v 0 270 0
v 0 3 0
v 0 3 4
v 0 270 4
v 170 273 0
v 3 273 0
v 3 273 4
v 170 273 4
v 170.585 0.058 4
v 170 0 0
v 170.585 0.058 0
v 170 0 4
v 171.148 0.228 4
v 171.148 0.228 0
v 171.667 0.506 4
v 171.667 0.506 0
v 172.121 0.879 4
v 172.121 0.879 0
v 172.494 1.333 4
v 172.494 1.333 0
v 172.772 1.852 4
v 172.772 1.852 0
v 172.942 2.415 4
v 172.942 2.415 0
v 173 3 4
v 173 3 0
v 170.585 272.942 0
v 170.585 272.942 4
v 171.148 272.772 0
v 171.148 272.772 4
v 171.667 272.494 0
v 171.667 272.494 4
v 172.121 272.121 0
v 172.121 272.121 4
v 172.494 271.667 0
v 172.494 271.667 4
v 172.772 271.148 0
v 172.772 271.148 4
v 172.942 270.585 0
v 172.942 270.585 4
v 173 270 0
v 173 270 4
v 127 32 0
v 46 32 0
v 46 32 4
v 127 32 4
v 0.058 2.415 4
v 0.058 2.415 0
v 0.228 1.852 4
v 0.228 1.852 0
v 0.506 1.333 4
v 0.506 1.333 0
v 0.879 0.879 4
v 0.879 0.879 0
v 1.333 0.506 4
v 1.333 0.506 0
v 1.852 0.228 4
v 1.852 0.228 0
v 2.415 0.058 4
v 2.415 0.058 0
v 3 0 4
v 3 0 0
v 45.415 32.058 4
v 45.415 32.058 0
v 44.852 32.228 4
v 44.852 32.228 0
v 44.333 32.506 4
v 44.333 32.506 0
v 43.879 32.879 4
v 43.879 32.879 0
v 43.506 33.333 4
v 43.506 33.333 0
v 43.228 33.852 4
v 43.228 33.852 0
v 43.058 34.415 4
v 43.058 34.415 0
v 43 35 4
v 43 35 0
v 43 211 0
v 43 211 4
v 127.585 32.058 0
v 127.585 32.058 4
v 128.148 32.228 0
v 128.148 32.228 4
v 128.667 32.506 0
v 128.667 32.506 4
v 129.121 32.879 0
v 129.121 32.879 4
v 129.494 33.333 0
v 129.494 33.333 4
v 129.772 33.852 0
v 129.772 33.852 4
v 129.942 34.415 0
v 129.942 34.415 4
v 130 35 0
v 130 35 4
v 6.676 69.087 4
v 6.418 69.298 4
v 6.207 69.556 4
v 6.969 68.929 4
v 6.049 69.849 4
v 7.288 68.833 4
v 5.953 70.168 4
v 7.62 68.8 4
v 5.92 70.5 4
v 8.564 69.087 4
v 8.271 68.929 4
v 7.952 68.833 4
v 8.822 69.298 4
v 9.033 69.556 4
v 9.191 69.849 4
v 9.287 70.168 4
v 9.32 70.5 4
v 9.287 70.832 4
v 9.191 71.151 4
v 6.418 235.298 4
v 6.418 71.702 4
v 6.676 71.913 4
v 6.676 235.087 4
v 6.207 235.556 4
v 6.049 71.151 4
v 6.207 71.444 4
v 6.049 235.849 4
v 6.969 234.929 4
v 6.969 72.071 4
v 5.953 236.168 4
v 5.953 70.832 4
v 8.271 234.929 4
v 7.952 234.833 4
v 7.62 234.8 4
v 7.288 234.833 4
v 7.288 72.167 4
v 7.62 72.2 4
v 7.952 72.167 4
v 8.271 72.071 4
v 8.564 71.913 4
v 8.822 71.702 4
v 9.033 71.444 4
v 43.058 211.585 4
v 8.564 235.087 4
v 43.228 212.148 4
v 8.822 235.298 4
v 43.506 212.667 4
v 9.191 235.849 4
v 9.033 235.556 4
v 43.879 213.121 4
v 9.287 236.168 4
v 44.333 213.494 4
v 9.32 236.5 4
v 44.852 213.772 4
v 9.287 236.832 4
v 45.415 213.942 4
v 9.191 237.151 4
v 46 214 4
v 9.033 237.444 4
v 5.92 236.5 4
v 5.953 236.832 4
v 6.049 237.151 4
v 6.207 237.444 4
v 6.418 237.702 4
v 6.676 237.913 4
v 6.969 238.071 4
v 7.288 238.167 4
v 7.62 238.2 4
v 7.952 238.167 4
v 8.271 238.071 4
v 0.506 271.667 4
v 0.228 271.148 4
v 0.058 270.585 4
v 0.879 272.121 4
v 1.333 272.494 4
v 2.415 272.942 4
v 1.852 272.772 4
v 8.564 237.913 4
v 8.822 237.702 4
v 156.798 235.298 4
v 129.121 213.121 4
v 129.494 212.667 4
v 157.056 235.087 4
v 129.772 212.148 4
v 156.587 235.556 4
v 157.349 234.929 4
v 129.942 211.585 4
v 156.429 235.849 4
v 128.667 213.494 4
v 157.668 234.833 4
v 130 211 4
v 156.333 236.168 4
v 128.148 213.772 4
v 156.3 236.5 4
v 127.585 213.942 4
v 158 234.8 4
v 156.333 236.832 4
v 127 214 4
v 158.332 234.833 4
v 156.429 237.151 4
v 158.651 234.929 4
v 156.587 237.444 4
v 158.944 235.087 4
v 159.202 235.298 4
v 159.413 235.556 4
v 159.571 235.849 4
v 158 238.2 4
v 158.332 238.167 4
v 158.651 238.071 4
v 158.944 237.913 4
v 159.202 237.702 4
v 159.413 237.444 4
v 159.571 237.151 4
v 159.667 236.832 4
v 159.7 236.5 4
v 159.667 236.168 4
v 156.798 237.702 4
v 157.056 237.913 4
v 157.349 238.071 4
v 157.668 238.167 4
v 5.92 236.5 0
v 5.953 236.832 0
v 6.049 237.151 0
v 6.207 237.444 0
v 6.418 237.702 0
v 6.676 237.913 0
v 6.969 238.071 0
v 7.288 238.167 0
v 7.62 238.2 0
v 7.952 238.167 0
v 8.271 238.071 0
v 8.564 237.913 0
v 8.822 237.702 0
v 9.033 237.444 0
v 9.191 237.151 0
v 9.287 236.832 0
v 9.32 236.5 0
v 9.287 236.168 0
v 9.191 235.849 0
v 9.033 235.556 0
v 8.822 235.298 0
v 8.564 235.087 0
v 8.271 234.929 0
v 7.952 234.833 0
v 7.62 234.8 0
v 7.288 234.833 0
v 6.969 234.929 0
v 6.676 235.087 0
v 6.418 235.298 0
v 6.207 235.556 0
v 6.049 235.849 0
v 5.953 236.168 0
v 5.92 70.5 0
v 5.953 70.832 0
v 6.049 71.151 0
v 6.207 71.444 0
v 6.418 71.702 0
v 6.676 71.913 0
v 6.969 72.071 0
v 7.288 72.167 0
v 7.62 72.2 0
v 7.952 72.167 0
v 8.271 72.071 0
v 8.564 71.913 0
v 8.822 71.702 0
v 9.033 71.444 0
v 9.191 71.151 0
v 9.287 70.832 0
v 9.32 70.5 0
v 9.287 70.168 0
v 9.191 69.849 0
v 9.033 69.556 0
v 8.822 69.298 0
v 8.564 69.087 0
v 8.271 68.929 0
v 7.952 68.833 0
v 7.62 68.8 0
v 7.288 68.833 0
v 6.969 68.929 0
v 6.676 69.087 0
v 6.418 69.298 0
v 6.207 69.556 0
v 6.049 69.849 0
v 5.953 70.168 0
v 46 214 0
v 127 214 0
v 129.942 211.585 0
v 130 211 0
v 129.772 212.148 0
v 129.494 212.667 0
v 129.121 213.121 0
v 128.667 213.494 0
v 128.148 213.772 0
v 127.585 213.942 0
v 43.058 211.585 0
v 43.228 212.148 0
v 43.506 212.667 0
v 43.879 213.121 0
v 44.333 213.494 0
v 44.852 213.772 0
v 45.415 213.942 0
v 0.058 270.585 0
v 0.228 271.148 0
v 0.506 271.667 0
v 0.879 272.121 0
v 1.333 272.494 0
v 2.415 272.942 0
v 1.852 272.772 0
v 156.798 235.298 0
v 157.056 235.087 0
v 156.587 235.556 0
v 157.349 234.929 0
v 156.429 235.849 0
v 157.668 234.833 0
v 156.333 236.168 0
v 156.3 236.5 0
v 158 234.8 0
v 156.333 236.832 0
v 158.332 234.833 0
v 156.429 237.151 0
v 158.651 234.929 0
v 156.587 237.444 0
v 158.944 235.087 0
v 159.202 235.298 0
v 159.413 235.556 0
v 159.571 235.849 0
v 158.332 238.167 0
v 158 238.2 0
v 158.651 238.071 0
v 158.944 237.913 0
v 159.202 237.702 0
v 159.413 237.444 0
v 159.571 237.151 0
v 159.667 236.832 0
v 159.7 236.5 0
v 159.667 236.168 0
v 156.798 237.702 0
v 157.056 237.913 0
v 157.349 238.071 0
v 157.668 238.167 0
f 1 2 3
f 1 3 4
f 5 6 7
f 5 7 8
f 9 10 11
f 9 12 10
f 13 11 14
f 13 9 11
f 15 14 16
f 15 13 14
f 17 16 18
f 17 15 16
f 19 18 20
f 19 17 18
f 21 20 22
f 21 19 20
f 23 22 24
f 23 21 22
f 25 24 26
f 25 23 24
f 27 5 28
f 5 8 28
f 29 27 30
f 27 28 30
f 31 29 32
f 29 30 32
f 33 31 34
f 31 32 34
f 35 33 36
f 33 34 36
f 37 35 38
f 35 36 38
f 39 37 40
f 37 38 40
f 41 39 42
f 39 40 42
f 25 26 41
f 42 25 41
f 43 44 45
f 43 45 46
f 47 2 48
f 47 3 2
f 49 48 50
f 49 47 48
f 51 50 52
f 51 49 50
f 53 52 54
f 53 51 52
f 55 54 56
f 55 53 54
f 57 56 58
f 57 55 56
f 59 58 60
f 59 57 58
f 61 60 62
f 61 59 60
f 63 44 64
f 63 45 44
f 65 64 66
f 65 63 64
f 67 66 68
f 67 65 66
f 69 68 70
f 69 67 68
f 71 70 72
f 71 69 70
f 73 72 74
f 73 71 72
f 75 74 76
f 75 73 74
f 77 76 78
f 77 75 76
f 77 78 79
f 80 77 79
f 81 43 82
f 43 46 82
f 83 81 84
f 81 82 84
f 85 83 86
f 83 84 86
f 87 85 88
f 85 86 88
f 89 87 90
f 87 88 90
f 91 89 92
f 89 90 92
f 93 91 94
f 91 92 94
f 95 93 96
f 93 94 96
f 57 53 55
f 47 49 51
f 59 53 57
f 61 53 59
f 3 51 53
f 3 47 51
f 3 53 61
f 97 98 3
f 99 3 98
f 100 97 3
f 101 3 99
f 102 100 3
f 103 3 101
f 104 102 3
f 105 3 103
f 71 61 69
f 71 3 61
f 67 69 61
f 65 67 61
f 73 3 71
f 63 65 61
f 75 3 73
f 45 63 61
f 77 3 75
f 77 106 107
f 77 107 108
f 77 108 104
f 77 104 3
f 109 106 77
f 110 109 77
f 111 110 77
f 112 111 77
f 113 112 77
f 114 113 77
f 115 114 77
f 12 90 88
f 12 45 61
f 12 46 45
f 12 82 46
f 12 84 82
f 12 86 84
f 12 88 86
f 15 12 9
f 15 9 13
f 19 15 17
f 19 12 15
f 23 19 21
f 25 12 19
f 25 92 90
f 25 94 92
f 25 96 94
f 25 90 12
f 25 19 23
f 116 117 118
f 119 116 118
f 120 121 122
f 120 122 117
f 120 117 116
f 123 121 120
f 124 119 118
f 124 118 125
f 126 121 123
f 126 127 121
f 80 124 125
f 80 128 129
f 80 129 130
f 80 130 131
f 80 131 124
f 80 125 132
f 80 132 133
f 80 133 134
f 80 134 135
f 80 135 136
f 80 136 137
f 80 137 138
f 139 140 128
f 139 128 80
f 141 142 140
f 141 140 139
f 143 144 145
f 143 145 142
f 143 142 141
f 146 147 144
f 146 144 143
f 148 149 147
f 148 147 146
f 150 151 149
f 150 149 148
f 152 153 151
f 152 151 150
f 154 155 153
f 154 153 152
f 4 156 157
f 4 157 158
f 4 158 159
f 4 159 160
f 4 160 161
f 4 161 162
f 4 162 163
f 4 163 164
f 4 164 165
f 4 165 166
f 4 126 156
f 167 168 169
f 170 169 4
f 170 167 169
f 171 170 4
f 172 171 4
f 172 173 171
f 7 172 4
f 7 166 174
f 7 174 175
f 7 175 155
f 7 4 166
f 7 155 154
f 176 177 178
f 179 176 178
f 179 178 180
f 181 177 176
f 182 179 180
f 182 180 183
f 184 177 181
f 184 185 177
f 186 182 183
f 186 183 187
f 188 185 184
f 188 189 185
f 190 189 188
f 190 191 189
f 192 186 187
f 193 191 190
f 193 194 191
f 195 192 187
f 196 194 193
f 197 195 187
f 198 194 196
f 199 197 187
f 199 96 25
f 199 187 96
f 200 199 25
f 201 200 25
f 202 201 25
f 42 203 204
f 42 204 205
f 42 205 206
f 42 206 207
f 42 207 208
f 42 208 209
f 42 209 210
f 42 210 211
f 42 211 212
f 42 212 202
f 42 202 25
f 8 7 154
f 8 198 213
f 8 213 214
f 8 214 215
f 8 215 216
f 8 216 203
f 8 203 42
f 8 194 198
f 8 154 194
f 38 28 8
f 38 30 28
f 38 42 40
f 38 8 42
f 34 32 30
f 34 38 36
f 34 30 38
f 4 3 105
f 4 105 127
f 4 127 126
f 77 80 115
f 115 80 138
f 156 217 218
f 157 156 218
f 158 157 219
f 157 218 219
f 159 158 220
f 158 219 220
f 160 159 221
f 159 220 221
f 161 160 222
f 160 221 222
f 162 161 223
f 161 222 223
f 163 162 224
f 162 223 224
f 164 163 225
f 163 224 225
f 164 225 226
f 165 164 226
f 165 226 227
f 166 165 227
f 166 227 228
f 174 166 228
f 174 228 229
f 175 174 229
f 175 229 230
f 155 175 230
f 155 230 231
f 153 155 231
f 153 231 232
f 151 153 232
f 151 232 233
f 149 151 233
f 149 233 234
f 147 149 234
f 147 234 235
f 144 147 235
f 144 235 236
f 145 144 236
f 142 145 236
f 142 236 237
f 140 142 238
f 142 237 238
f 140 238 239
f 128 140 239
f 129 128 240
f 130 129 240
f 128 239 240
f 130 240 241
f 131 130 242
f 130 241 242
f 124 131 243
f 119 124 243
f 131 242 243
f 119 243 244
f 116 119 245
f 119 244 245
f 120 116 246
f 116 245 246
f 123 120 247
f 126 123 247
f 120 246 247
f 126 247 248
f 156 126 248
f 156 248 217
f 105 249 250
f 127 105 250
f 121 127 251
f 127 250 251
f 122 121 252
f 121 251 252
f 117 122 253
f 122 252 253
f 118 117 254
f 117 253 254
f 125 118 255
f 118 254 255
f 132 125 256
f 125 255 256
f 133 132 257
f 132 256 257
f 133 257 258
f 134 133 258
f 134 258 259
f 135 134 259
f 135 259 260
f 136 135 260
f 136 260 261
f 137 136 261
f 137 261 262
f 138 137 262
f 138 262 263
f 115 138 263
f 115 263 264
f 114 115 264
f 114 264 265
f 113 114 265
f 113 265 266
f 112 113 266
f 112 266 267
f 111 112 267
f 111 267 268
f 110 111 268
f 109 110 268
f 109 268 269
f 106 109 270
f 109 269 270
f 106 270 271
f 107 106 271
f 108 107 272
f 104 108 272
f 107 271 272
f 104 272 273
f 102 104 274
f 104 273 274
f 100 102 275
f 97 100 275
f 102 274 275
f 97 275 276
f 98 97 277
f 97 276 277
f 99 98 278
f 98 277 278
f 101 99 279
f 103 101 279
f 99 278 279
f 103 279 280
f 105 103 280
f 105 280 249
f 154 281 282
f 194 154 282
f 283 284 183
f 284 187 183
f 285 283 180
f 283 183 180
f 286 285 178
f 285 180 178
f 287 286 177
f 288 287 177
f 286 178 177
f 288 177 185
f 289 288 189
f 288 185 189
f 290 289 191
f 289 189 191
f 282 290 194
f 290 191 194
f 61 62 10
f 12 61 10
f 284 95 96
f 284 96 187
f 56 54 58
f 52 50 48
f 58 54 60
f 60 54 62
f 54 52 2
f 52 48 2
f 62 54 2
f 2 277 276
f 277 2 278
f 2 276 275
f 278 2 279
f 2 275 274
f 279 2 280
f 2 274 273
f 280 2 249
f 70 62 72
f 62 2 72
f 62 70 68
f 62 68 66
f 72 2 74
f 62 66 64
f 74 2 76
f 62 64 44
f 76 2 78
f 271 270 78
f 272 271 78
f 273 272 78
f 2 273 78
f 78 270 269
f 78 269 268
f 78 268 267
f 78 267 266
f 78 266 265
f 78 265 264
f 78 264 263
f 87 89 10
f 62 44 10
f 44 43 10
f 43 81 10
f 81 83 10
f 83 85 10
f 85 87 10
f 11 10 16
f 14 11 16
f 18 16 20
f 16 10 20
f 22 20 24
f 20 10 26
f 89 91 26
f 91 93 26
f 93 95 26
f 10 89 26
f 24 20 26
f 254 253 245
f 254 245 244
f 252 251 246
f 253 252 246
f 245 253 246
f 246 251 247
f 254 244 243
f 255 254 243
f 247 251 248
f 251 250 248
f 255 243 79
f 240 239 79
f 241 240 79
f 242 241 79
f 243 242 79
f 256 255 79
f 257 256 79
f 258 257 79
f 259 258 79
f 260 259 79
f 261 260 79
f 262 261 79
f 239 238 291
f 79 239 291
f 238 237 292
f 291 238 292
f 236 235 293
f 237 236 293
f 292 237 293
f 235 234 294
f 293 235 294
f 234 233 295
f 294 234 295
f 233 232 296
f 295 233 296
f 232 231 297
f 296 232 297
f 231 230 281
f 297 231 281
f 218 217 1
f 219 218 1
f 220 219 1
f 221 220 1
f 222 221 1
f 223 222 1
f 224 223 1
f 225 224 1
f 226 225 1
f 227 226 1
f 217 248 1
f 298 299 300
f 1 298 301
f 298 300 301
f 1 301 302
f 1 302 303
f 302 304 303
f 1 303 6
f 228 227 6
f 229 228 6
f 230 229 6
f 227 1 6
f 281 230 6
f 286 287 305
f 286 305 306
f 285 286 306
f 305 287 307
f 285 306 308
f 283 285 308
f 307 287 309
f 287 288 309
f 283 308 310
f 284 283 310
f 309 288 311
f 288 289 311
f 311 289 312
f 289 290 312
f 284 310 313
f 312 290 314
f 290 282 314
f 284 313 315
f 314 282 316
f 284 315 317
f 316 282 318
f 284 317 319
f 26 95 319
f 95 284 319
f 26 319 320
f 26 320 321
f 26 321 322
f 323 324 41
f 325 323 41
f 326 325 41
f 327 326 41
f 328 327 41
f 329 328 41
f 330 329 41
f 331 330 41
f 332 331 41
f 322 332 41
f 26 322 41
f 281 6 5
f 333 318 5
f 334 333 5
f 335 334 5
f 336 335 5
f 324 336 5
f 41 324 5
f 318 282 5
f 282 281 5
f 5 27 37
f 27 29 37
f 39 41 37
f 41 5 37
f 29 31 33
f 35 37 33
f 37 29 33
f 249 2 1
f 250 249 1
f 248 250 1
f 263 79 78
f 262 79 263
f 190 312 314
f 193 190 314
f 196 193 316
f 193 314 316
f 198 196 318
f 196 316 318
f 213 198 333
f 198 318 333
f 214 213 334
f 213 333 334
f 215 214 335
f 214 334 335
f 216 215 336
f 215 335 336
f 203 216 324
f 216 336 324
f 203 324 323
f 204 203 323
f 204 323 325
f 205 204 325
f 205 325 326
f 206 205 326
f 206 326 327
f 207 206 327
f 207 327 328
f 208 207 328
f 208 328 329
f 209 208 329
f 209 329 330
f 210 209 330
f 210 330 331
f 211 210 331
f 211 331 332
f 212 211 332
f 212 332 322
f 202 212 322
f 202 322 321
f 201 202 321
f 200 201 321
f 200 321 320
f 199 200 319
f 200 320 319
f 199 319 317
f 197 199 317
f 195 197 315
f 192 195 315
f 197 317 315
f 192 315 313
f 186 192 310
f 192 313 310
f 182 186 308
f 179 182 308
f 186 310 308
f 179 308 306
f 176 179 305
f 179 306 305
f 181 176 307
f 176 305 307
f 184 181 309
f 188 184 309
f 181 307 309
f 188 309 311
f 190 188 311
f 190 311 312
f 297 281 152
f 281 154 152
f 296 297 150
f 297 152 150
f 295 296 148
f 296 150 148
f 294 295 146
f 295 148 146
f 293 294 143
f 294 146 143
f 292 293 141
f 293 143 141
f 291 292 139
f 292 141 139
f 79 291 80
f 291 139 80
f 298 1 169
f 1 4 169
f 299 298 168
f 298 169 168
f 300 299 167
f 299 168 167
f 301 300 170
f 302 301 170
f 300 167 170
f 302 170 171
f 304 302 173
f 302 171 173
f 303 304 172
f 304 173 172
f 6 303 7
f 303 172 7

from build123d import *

# Parameters (mm, degrees)
ESQUISSE1_W        = 173
ESQUISSE1_H        = 273
ESQUISSE1_R        = 1.5
ESQUISSE1_W_2      = 87
ESQUISSE1_H_2      = 182
BOSS_EXTRU_1_DEPTH = 4
CONG_1_R           = 3
D_GAGEMENT_M31_D   = 3.4


with BuildPart() as part:
    # Esquisse1 → Boss.-Extru.1 (new body)
    with BuildSketch(Plane.XY):
        with Locations((86.5, 136.5)):
            Rectangle(ESQUISSE1_W, ESQUISSE1_H)
        with Locations((7.62, 236.5)):
            Circle(ESQUISSE1_R, mode=Mode.SUBTRACT)
        with Locations((7.62, 70.5)):
            Circle(ESQUISSE1_R, mode=Mode.SUBTRACT)
        with Locations((158, 236.5)):
            Circle(ESQUISSE1_R, mode=Mode.SUBTRACT)
        with Locations((86.5, 123)):
            Rectangle(ESQUISSE1_W_2, ESQUISSE1_H_2, mode=Mode.SUBTRACT)
    extrude(amount=BOSS_EXTRU_1_DEPTH)

    # Congé1
    cong_1_edges = [part.edges().sort_by_distance(p)[0] for p in [
        (43, 214, 2),
        (43, 32, 2),
        (130, 32, 2),
        (130, 214, 2),
        (0, 273, 2),
        (173, 273, 2),
        (173, 0, 2),
        (0, 0, 2),
    ]]
    fillet(cong_1_edges, radius=CONG_1_R)

    # Dégagement M31 (through all)
    with Locations(Plane.XY.offset(4)):
        with Locations((7.62, 236.5), (7.62, 70.5), (158, 236.5)):
            Hole(D_GAGEMENT_M31_D / 2)


solid = part.part
